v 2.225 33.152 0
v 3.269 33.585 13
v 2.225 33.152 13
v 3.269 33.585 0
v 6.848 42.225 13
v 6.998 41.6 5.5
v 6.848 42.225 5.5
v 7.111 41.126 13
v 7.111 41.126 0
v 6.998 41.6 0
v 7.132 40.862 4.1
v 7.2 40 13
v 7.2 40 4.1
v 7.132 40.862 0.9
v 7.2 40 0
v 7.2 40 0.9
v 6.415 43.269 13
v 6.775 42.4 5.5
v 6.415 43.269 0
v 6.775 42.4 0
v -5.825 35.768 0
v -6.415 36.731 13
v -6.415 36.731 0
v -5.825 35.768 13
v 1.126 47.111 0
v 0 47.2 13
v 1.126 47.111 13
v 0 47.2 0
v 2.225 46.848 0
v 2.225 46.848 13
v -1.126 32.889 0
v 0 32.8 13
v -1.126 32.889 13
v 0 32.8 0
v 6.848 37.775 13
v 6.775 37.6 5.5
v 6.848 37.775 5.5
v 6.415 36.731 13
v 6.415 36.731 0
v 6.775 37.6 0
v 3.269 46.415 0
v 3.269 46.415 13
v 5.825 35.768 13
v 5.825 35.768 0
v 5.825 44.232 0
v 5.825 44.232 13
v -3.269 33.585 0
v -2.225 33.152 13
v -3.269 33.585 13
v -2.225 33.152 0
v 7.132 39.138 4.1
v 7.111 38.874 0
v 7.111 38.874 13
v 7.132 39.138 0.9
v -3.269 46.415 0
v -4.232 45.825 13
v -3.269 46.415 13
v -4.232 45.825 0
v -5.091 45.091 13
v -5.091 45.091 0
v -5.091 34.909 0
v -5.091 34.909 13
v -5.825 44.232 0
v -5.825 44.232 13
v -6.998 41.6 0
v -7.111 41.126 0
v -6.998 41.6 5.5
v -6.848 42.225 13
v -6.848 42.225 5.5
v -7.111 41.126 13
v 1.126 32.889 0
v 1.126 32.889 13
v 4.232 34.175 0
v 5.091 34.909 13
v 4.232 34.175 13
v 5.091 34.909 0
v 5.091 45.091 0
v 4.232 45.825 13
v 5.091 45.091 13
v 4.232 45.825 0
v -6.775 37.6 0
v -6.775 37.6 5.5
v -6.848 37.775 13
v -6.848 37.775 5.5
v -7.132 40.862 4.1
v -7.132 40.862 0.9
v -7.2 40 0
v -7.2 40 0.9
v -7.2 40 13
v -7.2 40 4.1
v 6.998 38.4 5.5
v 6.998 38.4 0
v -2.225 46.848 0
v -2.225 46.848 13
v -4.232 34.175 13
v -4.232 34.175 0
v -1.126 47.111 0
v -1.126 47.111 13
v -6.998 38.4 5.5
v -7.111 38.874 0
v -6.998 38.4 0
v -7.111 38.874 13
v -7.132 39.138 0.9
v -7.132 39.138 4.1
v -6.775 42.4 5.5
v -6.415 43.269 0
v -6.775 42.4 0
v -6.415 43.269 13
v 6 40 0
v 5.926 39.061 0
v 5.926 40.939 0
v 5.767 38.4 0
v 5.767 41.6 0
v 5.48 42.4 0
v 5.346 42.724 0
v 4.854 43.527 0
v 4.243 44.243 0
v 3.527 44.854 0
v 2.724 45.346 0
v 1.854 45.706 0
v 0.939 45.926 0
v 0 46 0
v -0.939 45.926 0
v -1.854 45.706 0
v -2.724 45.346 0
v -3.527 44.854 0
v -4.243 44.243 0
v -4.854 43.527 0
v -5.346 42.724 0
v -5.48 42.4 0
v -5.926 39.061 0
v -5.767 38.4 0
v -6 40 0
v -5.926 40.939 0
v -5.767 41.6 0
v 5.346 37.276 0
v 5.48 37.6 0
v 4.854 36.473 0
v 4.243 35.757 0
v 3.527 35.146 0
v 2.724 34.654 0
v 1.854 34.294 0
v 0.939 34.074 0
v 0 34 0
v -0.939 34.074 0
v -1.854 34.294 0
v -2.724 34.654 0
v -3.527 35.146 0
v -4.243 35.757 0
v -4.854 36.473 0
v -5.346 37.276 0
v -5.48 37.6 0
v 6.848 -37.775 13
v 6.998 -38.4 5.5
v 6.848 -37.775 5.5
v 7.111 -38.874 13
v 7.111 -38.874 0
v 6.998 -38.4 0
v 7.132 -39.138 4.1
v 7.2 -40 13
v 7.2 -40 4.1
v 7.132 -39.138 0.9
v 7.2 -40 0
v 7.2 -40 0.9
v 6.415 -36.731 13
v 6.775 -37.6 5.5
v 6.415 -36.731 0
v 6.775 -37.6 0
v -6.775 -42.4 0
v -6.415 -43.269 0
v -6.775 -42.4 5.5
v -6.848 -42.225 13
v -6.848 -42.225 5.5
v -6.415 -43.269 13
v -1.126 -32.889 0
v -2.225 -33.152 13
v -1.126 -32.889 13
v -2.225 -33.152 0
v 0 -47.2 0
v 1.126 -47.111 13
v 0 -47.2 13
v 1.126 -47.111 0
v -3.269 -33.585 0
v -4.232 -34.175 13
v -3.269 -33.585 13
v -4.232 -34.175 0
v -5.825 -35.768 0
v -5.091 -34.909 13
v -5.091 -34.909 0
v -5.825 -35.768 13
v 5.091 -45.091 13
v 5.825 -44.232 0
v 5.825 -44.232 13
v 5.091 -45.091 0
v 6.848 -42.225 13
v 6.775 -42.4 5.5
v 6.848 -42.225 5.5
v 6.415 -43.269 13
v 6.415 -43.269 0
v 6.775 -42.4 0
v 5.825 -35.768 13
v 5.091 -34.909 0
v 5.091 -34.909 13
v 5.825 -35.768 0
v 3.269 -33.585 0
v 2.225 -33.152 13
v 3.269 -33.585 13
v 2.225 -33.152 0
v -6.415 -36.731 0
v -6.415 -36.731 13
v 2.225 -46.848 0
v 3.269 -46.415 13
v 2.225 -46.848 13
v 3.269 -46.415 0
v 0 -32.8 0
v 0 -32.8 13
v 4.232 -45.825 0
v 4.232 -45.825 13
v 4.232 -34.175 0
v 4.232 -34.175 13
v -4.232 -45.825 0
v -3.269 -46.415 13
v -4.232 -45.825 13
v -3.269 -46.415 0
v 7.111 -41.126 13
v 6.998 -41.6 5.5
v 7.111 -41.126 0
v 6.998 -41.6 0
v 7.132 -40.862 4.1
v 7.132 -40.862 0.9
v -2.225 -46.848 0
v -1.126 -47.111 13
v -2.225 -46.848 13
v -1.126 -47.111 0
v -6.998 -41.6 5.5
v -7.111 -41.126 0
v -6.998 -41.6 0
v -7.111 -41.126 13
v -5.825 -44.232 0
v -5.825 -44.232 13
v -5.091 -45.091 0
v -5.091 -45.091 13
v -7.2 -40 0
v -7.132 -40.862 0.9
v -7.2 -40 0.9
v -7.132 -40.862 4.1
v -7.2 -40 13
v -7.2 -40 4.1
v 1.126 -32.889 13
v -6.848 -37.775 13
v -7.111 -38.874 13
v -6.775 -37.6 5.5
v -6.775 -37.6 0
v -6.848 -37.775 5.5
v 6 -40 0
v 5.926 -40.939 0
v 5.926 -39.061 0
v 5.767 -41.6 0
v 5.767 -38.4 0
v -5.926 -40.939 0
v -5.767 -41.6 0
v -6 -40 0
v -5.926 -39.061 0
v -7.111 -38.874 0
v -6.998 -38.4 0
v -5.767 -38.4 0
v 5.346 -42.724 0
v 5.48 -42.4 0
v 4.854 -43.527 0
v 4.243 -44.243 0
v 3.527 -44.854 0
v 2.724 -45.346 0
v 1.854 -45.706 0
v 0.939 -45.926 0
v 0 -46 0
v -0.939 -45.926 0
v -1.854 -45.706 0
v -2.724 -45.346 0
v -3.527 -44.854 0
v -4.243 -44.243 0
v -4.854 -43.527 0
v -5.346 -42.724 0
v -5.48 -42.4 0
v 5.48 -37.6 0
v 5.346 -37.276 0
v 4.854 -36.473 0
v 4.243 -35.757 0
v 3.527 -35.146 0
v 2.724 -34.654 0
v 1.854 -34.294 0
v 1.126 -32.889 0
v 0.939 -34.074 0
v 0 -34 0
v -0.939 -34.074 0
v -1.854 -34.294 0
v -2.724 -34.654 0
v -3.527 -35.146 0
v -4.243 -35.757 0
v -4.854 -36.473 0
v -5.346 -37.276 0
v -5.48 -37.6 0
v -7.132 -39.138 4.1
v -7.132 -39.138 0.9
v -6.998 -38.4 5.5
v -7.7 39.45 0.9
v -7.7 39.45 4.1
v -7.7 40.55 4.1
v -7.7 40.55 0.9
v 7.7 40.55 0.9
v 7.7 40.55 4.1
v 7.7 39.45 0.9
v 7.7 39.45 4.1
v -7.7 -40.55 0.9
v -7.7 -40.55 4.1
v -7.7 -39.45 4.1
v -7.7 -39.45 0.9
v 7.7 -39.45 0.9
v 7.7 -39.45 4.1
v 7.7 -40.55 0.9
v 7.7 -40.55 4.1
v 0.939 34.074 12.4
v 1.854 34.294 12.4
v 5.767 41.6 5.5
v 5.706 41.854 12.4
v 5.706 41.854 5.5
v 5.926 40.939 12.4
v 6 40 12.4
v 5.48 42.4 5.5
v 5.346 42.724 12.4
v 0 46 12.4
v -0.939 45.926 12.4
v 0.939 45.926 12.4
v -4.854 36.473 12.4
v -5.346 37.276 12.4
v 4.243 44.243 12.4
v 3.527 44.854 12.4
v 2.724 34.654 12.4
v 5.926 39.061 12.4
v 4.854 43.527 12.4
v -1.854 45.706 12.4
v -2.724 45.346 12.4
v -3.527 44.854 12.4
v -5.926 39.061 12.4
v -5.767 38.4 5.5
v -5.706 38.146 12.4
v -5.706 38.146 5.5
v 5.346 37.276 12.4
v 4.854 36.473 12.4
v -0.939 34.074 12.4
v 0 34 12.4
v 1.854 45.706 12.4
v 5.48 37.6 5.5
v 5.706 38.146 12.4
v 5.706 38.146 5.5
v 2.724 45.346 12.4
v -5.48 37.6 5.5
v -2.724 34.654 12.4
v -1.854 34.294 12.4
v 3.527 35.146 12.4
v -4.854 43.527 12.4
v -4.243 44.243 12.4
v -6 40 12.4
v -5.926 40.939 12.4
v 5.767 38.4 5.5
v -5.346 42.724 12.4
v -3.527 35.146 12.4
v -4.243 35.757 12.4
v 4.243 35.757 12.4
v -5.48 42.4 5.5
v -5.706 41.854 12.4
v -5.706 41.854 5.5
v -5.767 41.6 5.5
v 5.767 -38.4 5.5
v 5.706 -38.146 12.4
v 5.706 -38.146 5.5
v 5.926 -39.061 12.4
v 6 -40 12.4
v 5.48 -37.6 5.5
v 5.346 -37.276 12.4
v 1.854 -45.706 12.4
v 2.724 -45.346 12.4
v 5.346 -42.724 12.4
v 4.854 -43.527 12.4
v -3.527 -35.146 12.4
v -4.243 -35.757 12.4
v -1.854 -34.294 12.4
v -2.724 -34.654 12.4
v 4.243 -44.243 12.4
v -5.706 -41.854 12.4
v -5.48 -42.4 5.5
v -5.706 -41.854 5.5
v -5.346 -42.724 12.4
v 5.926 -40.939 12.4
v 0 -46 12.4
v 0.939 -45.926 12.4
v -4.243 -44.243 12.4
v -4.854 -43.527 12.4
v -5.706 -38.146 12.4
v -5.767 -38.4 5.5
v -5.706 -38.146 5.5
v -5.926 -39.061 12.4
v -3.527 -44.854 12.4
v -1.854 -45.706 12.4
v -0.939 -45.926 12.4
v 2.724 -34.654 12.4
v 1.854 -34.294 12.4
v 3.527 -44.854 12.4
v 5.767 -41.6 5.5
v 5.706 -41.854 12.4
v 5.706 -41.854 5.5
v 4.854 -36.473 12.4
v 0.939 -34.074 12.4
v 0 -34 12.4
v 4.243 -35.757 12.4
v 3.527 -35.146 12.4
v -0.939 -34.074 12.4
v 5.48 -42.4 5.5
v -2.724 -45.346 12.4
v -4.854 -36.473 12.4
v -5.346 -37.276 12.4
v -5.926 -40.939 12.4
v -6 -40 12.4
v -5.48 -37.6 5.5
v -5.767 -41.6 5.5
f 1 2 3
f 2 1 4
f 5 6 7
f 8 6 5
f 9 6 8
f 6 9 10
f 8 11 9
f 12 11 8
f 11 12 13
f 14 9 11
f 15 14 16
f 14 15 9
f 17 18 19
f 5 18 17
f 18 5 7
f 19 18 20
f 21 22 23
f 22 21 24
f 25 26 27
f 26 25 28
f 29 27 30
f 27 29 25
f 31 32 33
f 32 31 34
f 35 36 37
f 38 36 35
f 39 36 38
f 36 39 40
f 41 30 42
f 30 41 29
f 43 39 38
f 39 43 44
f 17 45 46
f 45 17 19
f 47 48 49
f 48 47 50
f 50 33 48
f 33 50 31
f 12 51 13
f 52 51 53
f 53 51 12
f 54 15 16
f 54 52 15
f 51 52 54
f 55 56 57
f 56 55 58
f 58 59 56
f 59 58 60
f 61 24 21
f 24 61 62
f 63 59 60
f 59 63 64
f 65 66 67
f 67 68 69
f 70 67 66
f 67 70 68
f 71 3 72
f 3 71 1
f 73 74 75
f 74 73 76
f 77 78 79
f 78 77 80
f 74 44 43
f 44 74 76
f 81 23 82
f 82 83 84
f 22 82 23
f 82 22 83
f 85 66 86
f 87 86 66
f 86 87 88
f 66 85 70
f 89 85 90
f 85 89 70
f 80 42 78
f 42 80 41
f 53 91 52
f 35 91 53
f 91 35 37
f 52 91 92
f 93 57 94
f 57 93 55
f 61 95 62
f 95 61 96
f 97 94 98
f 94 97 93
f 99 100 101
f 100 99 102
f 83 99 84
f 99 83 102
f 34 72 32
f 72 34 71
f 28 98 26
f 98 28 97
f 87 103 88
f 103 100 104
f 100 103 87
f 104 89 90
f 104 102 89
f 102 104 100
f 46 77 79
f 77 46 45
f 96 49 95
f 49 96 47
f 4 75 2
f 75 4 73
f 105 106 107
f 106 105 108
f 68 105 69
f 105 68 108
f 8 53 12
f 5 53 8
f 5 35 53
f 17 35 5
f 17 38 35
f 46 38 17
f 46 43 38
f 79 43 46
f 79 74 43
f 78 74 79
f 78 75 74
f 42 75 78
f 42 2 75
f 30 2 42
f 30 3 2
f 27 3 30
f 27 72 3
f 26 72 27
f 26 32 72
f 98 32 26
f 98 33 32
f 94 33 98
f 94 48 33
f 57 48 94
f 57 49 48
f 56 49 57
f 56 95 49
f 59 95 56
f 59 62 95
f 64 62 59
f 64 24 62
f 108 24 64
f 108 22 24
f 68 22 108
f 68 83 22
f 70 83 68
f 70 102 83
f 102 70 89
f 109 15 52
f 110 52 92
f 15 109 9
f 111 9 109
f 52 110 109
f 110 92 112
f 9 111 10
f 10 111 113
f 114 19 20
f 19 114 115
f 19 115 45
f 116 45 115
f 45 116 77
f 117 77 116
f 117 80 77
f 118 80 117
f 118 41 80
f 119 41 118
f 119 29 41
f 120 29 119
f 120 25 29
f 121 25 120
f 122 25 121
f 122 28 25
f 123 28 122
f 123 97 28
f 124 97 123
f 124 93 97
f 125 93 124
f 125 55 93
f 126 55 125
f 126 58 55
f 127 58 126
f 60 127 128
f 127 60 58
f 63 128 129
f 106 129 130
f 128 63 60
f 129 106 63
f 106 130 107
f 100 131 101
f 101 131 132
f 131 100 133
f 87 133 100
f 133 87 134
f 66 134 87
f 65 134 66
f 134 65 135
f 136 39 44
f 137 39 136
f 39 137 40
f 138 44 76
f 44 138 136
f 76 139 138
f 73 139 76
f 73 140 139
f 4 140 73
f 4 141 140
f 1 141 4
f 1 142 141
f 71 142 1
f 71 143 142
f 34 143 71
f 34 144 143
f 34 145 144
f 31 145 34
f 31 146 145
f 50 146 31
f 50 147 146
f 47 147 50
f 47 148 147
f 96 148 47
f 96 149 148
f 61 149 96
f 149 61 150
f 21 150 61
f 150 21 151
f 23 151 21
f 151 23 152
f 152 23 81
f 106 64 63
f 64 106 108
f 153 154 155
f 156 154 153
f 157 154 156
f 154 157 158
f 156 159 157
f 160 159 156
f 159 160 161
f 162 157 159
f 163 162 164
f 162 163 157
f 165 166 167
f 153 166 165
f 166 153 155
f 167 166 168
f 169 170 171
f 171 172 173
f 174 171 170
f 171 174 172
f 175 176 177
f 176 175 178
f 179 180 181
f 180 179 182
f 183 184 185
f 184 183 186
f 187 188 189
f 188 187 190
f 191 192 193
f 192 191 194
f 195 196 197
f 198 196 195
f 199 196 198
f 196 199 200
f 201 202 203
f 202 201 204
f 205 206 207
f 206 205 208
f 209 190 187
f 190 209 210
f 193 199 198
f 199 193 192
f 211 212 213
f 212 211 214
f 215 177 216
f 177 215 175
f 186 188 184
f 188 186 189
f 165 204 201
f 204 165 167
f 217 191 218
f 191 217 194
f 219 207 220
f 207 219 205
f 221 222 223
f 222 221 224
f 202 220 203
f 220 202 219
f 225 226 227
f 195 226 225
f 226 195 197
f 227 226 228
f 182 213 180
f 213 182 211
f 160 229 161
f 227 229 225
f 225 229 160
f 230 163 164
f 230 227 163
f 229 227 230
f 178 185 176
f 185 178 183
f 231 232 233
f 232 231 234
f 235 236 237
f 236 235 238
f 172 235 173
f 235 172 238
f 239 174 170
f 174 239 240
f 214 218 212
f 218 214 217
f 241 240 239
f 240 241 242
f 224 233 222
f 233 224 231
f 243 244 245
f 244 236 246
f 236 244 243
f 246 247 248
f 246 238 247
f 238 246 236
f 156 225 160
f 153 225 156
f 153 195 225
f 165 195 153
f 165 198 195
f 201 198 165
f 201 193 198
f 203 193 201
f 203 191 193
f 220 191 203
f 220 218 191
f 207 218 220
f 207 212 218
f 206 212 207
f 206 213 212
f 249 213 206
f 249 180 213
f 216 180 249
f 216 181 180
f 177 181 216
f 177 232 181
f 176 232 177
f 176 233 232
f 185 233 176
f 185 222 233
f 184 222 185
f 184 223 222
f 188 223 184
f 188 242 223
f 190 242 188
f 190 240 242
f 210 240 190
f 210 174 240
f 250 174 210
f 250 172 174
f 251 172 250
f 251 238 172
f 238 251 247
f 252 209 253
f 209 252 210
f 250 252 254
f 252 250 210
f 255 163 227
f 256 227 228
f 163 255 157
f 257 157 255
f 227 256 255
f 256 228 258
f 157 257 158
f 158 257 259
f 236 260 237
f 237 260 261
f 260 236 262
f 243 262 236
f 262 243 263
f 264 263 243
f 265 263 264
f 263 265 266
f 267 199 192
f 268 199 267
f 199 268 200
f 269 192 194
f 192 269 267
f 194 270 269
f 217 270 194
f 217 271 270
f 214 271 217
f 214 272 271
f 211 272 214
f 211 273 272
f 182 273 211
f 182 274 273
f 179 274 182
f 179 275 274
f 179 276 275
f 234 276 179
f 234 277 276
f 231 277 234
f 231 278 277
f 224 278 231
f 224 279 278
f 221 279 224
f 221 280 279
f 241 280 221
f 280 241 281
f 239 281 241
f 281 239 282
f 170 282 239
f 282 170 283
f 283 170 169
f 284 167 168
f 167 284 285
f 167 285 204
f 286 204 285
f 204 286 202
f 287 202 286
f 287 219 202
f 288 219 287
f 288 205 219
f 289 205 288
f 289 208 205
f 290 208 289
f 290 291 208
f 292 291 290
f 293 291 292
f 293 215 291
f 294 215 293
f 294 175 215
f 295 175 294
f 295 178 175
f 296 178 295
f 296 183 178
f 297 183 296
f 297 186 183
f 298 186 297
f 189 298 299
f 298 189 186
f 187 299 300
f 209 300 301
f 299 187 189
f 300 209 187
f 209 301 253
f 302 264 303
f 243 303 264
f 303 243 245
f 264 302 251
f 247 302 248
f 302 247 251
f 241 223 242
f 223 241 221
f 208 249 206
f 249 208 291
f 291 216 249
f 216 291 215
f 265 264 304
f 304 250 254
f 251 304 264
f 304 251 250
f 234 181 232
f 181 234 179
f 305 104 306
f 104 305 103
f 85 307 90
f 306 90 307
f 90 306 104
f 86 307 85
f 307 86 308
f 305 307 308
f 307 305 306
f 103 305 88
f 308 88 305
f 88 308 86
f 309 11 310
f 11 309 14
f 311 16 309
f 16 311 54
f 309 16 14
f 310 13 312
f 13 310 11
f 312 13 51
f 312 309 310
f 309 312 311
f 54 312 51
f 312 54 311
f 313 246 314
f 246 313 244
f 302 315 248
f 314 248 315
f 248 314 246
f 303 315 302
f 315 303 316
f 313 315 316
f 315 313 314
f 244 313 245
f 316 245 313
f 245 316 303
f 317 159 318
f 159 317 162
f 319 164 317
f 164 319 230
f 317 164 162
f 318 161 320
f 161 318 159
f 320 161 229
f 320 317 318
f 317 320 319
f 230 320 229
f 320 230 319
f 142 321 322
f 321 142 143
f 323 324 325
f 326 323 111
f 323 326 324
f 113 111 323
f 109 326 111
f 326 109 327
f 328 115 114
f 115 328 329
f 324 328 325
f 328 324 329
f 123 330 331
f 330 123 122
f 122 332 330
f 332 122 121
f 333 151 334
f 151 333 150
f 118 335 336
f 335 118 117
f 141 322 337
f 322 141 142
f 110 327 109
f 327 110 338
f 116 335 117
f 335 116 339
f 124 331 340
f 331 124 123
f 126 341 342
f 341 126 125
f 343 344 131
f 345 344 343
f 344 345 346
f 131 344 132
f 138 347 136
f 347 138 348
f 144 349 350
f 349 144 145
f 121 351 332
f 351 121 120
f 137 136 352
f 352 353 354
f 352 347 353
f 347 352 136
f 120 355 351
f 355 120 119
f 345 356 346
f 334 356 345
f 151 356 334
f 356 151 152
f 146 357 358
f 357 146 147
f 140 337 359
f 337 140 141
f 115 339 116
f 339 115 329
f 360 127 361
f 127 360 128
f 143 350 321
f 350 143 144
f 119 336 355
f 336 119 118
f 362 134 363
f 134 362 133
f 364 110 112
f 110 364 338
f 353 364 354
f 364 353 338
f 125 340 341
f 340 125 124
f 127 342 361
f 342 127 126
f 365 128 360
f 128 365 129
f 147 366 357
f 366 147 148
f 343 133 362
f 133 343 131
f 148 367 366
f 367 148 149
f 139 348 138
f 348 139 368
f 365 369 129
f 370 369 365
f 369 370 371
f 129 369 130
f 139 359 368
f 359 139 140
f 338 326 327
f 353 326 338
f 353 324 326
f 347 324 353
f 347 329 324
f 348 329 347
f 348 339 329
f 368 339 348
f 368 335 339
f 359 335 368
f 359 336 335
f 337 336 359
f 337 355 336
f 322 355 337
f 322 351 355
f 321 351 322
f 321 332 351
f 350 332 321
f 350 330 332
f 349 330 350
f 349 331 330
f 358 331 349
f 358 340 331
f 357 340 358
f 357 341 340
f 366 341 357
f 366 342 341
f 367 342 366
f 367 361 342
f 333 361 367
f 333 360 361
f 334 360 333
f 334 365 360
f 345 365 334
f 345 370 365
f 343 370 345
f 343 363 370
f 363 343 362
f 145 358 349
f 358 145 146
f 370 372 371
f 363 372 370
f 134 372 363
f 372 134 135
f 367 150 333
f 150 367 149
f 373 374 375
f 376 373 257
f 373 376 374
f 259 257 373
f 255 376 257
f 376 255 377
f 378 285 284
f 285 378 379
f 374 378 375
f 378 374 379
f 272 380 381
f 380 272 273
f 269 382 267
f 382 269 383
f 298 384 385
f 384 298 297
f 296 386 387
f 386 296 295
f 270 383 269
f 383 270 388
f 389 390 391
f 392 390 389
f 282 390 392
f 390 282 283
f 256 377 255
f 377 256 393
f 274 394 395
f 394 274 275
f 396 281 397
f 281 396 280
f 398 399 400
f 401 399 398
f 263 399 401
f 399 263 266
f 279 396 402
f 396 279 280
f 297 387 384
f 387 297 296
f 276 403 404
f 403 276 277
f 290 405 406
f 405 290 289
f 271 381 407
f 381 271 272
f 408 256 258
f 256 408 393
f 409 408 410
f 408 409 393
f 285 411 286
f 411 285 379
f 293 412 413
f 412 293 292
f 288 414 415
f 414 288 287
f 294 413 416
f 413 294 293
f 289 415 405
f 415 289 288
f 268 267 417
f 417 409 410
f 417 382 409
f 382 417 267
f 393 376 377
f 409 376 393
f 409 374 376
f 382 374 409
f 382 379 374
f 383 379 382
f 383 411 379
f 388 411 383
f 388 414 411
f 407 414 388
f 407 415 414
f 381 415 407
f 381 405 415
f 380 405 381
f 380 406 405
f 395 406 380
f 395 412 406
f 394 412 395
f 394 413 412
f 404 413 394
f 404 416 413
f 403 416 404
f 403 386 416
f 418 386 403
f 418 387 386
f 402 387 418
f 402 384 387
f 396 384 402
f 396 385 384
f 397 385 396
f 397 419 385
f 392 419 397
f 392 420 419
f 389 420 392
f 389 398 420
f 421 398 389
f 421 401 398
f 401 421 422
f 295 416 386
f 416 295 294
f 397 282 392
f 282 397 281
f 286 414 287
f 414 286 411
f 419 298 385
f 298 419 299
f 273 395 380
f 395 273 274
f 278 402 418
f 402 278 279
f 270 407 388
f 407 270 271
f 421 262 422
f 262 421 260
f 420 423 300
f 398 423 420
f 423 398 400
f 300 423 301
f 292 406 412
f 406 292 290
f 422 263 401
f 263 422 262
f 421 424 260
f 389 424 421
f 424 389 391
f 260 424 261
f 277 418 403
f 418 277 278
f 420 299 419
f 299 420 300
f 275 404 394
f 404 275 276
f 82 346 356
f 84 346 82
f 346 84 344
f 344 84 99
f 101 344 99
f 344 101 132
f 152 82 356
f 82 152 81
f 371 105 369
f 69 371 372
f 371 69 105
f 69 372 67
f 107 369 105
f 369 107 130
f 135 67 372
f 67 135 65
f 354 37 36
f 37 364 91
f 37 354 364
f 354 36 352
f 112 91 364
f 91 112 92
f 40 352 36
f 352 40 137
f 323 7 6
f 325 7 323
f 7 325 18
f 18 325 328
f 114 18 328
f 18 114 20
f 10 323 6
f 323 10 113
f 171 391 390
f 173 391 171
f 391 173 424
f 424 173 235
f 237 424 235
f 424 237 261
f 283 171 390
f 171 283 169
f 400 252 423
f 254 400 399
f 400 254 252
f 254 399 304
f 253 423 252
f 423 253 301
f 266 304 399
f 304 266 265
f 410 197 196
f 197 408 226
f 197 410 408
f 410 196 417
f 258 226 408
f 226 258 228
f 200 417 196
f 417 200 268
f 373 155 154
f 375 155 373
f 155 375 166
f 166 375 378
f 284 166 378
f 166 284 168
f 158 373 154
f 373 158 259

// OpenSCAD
// file: colon_lightguide.scad
// Colon Dots Lightguide / Diffuser (Parametric)
// Solid continuous reflector walls (No wire cutouts)
// Optimized for maximum brightness: 0.6mm and 0.8mm top diffuser layer variants

// --- Configuration Parameter ---
diffuser_thick = 0.6; // [0.6: High Brightness (0.6mm), 0.8: Balanced (0.8mm), 1.0: Standard (1.0mm)]

total_depth = 13.0;   // Matches frontplate housing depth (13.0 mm)
tunnel_depth = total_depth - diffuser_thick; // Inner cavity depth (12.4mm for 0.6, 12.2mm for 0.8)

// --- Colon Dimensions (matching colon_pogo.scad) ---
colon_y_offset = 40.0;
colon_radius = 6.0;
white_wall = 1.2;
enable_lightguide_snap_locks = true;

// Snap-lock detents & tabs geometry
module colon_lightguide_snap_teeth(is_subtraction = false) {
    if (enable_lightguide_snap_locks) {
        tooth_w = 3.2;
        tooth_h = 2.2;
        tooth_reach = is_subtraction ? 0.7 : 0.5;
        
        for (y = [colon_y_offset, -colon_y_offset]) {
            for (side = [-1, 1]) {
                translate([side * (colon_radius + white_wall), y, 2.5]) {
                    if (is_subtraction) {
                        cube([tooth_reach * 2 + 0.4, tooth_w + 0.4, tooth_h + 0.4], center=true);
                    } else {
                        // Sunk 0.5mm into cylinder wall to guarantee 100% clean manifold union
                        rotate([0, side > 0 ? 0 : 180, 0])
                            linear_extrude(tooth_w, center=true)
                                polygon([
                                    [-0.5, -tooth_h/2],
                                    [tooth_reach, -tooth_h/4],
                                    [tooth_reach, tooth_h/4],
                                    [-0.5, tooth_h/2]
                                ]);
                    }
                }
            }
        }
    }
}

module colon_lightguide_flex_slits() {
    if (enable_lightguide_snap_locks) {
        slit_w = 0.8;
        slit_l = 4.0;
        slit_h = 5.5;
        for (y = [colon_y_offset, -colon_y_offset]) {
            for (side = [-1, 1]) {
                for (dy = [-2.0, 2.0]) {
                    translate([side * (colon_radius + white_wall), y + dy, slit_h/2 - 0.1])
                        cube([slit_l, slit_w, slit_h + 0.2], center=true);
                }
            }
        }
    }
}

module colon_frontplate_white(d_thick = diffuser_thick) {
    t_depth = total_depth - d_thick;
    difference() {
        union() {
            // Outer white reflector walls + top diffuser (Total depth = 13.0 mm)
            for (y = [colon_y_offset, -colon_y_offset]) {
                translate([0, y, 0]) cylinder(h=total_depth, r=colon_radius + white_wall, $fn=40);
            }
            
            // Outward snap-lock teeth on lightguide sides (cleanly embedded)
            colon_lightguide_snap_teeth(is_subtraction = false);
        }
        
        // Hollow light tunnel cavity, leaving d_thick solid diffuser face on top
        for (y = [colon_y_offset, -colon_y_offset]) {
            translate([0, y, -0.1]) cylinder(h=t_depth + 0.1, r=colon_radius, $fn=40);
        }
        
        // Compliance flex slits allowing snap teeth to deflect on insertion
        colon_lightguide_flex_slits();
    }
}

// Default render
color("White") colon_frontplate_white(diffuser_thick);
// main file
// Colon Dots Lightguide / Diffuser - 0.6 mm Variant
// High brightness / maximum light transmission variant
include <colon_lightguide.scad>
colon_frontplate_white(d_thick = 0.6);
